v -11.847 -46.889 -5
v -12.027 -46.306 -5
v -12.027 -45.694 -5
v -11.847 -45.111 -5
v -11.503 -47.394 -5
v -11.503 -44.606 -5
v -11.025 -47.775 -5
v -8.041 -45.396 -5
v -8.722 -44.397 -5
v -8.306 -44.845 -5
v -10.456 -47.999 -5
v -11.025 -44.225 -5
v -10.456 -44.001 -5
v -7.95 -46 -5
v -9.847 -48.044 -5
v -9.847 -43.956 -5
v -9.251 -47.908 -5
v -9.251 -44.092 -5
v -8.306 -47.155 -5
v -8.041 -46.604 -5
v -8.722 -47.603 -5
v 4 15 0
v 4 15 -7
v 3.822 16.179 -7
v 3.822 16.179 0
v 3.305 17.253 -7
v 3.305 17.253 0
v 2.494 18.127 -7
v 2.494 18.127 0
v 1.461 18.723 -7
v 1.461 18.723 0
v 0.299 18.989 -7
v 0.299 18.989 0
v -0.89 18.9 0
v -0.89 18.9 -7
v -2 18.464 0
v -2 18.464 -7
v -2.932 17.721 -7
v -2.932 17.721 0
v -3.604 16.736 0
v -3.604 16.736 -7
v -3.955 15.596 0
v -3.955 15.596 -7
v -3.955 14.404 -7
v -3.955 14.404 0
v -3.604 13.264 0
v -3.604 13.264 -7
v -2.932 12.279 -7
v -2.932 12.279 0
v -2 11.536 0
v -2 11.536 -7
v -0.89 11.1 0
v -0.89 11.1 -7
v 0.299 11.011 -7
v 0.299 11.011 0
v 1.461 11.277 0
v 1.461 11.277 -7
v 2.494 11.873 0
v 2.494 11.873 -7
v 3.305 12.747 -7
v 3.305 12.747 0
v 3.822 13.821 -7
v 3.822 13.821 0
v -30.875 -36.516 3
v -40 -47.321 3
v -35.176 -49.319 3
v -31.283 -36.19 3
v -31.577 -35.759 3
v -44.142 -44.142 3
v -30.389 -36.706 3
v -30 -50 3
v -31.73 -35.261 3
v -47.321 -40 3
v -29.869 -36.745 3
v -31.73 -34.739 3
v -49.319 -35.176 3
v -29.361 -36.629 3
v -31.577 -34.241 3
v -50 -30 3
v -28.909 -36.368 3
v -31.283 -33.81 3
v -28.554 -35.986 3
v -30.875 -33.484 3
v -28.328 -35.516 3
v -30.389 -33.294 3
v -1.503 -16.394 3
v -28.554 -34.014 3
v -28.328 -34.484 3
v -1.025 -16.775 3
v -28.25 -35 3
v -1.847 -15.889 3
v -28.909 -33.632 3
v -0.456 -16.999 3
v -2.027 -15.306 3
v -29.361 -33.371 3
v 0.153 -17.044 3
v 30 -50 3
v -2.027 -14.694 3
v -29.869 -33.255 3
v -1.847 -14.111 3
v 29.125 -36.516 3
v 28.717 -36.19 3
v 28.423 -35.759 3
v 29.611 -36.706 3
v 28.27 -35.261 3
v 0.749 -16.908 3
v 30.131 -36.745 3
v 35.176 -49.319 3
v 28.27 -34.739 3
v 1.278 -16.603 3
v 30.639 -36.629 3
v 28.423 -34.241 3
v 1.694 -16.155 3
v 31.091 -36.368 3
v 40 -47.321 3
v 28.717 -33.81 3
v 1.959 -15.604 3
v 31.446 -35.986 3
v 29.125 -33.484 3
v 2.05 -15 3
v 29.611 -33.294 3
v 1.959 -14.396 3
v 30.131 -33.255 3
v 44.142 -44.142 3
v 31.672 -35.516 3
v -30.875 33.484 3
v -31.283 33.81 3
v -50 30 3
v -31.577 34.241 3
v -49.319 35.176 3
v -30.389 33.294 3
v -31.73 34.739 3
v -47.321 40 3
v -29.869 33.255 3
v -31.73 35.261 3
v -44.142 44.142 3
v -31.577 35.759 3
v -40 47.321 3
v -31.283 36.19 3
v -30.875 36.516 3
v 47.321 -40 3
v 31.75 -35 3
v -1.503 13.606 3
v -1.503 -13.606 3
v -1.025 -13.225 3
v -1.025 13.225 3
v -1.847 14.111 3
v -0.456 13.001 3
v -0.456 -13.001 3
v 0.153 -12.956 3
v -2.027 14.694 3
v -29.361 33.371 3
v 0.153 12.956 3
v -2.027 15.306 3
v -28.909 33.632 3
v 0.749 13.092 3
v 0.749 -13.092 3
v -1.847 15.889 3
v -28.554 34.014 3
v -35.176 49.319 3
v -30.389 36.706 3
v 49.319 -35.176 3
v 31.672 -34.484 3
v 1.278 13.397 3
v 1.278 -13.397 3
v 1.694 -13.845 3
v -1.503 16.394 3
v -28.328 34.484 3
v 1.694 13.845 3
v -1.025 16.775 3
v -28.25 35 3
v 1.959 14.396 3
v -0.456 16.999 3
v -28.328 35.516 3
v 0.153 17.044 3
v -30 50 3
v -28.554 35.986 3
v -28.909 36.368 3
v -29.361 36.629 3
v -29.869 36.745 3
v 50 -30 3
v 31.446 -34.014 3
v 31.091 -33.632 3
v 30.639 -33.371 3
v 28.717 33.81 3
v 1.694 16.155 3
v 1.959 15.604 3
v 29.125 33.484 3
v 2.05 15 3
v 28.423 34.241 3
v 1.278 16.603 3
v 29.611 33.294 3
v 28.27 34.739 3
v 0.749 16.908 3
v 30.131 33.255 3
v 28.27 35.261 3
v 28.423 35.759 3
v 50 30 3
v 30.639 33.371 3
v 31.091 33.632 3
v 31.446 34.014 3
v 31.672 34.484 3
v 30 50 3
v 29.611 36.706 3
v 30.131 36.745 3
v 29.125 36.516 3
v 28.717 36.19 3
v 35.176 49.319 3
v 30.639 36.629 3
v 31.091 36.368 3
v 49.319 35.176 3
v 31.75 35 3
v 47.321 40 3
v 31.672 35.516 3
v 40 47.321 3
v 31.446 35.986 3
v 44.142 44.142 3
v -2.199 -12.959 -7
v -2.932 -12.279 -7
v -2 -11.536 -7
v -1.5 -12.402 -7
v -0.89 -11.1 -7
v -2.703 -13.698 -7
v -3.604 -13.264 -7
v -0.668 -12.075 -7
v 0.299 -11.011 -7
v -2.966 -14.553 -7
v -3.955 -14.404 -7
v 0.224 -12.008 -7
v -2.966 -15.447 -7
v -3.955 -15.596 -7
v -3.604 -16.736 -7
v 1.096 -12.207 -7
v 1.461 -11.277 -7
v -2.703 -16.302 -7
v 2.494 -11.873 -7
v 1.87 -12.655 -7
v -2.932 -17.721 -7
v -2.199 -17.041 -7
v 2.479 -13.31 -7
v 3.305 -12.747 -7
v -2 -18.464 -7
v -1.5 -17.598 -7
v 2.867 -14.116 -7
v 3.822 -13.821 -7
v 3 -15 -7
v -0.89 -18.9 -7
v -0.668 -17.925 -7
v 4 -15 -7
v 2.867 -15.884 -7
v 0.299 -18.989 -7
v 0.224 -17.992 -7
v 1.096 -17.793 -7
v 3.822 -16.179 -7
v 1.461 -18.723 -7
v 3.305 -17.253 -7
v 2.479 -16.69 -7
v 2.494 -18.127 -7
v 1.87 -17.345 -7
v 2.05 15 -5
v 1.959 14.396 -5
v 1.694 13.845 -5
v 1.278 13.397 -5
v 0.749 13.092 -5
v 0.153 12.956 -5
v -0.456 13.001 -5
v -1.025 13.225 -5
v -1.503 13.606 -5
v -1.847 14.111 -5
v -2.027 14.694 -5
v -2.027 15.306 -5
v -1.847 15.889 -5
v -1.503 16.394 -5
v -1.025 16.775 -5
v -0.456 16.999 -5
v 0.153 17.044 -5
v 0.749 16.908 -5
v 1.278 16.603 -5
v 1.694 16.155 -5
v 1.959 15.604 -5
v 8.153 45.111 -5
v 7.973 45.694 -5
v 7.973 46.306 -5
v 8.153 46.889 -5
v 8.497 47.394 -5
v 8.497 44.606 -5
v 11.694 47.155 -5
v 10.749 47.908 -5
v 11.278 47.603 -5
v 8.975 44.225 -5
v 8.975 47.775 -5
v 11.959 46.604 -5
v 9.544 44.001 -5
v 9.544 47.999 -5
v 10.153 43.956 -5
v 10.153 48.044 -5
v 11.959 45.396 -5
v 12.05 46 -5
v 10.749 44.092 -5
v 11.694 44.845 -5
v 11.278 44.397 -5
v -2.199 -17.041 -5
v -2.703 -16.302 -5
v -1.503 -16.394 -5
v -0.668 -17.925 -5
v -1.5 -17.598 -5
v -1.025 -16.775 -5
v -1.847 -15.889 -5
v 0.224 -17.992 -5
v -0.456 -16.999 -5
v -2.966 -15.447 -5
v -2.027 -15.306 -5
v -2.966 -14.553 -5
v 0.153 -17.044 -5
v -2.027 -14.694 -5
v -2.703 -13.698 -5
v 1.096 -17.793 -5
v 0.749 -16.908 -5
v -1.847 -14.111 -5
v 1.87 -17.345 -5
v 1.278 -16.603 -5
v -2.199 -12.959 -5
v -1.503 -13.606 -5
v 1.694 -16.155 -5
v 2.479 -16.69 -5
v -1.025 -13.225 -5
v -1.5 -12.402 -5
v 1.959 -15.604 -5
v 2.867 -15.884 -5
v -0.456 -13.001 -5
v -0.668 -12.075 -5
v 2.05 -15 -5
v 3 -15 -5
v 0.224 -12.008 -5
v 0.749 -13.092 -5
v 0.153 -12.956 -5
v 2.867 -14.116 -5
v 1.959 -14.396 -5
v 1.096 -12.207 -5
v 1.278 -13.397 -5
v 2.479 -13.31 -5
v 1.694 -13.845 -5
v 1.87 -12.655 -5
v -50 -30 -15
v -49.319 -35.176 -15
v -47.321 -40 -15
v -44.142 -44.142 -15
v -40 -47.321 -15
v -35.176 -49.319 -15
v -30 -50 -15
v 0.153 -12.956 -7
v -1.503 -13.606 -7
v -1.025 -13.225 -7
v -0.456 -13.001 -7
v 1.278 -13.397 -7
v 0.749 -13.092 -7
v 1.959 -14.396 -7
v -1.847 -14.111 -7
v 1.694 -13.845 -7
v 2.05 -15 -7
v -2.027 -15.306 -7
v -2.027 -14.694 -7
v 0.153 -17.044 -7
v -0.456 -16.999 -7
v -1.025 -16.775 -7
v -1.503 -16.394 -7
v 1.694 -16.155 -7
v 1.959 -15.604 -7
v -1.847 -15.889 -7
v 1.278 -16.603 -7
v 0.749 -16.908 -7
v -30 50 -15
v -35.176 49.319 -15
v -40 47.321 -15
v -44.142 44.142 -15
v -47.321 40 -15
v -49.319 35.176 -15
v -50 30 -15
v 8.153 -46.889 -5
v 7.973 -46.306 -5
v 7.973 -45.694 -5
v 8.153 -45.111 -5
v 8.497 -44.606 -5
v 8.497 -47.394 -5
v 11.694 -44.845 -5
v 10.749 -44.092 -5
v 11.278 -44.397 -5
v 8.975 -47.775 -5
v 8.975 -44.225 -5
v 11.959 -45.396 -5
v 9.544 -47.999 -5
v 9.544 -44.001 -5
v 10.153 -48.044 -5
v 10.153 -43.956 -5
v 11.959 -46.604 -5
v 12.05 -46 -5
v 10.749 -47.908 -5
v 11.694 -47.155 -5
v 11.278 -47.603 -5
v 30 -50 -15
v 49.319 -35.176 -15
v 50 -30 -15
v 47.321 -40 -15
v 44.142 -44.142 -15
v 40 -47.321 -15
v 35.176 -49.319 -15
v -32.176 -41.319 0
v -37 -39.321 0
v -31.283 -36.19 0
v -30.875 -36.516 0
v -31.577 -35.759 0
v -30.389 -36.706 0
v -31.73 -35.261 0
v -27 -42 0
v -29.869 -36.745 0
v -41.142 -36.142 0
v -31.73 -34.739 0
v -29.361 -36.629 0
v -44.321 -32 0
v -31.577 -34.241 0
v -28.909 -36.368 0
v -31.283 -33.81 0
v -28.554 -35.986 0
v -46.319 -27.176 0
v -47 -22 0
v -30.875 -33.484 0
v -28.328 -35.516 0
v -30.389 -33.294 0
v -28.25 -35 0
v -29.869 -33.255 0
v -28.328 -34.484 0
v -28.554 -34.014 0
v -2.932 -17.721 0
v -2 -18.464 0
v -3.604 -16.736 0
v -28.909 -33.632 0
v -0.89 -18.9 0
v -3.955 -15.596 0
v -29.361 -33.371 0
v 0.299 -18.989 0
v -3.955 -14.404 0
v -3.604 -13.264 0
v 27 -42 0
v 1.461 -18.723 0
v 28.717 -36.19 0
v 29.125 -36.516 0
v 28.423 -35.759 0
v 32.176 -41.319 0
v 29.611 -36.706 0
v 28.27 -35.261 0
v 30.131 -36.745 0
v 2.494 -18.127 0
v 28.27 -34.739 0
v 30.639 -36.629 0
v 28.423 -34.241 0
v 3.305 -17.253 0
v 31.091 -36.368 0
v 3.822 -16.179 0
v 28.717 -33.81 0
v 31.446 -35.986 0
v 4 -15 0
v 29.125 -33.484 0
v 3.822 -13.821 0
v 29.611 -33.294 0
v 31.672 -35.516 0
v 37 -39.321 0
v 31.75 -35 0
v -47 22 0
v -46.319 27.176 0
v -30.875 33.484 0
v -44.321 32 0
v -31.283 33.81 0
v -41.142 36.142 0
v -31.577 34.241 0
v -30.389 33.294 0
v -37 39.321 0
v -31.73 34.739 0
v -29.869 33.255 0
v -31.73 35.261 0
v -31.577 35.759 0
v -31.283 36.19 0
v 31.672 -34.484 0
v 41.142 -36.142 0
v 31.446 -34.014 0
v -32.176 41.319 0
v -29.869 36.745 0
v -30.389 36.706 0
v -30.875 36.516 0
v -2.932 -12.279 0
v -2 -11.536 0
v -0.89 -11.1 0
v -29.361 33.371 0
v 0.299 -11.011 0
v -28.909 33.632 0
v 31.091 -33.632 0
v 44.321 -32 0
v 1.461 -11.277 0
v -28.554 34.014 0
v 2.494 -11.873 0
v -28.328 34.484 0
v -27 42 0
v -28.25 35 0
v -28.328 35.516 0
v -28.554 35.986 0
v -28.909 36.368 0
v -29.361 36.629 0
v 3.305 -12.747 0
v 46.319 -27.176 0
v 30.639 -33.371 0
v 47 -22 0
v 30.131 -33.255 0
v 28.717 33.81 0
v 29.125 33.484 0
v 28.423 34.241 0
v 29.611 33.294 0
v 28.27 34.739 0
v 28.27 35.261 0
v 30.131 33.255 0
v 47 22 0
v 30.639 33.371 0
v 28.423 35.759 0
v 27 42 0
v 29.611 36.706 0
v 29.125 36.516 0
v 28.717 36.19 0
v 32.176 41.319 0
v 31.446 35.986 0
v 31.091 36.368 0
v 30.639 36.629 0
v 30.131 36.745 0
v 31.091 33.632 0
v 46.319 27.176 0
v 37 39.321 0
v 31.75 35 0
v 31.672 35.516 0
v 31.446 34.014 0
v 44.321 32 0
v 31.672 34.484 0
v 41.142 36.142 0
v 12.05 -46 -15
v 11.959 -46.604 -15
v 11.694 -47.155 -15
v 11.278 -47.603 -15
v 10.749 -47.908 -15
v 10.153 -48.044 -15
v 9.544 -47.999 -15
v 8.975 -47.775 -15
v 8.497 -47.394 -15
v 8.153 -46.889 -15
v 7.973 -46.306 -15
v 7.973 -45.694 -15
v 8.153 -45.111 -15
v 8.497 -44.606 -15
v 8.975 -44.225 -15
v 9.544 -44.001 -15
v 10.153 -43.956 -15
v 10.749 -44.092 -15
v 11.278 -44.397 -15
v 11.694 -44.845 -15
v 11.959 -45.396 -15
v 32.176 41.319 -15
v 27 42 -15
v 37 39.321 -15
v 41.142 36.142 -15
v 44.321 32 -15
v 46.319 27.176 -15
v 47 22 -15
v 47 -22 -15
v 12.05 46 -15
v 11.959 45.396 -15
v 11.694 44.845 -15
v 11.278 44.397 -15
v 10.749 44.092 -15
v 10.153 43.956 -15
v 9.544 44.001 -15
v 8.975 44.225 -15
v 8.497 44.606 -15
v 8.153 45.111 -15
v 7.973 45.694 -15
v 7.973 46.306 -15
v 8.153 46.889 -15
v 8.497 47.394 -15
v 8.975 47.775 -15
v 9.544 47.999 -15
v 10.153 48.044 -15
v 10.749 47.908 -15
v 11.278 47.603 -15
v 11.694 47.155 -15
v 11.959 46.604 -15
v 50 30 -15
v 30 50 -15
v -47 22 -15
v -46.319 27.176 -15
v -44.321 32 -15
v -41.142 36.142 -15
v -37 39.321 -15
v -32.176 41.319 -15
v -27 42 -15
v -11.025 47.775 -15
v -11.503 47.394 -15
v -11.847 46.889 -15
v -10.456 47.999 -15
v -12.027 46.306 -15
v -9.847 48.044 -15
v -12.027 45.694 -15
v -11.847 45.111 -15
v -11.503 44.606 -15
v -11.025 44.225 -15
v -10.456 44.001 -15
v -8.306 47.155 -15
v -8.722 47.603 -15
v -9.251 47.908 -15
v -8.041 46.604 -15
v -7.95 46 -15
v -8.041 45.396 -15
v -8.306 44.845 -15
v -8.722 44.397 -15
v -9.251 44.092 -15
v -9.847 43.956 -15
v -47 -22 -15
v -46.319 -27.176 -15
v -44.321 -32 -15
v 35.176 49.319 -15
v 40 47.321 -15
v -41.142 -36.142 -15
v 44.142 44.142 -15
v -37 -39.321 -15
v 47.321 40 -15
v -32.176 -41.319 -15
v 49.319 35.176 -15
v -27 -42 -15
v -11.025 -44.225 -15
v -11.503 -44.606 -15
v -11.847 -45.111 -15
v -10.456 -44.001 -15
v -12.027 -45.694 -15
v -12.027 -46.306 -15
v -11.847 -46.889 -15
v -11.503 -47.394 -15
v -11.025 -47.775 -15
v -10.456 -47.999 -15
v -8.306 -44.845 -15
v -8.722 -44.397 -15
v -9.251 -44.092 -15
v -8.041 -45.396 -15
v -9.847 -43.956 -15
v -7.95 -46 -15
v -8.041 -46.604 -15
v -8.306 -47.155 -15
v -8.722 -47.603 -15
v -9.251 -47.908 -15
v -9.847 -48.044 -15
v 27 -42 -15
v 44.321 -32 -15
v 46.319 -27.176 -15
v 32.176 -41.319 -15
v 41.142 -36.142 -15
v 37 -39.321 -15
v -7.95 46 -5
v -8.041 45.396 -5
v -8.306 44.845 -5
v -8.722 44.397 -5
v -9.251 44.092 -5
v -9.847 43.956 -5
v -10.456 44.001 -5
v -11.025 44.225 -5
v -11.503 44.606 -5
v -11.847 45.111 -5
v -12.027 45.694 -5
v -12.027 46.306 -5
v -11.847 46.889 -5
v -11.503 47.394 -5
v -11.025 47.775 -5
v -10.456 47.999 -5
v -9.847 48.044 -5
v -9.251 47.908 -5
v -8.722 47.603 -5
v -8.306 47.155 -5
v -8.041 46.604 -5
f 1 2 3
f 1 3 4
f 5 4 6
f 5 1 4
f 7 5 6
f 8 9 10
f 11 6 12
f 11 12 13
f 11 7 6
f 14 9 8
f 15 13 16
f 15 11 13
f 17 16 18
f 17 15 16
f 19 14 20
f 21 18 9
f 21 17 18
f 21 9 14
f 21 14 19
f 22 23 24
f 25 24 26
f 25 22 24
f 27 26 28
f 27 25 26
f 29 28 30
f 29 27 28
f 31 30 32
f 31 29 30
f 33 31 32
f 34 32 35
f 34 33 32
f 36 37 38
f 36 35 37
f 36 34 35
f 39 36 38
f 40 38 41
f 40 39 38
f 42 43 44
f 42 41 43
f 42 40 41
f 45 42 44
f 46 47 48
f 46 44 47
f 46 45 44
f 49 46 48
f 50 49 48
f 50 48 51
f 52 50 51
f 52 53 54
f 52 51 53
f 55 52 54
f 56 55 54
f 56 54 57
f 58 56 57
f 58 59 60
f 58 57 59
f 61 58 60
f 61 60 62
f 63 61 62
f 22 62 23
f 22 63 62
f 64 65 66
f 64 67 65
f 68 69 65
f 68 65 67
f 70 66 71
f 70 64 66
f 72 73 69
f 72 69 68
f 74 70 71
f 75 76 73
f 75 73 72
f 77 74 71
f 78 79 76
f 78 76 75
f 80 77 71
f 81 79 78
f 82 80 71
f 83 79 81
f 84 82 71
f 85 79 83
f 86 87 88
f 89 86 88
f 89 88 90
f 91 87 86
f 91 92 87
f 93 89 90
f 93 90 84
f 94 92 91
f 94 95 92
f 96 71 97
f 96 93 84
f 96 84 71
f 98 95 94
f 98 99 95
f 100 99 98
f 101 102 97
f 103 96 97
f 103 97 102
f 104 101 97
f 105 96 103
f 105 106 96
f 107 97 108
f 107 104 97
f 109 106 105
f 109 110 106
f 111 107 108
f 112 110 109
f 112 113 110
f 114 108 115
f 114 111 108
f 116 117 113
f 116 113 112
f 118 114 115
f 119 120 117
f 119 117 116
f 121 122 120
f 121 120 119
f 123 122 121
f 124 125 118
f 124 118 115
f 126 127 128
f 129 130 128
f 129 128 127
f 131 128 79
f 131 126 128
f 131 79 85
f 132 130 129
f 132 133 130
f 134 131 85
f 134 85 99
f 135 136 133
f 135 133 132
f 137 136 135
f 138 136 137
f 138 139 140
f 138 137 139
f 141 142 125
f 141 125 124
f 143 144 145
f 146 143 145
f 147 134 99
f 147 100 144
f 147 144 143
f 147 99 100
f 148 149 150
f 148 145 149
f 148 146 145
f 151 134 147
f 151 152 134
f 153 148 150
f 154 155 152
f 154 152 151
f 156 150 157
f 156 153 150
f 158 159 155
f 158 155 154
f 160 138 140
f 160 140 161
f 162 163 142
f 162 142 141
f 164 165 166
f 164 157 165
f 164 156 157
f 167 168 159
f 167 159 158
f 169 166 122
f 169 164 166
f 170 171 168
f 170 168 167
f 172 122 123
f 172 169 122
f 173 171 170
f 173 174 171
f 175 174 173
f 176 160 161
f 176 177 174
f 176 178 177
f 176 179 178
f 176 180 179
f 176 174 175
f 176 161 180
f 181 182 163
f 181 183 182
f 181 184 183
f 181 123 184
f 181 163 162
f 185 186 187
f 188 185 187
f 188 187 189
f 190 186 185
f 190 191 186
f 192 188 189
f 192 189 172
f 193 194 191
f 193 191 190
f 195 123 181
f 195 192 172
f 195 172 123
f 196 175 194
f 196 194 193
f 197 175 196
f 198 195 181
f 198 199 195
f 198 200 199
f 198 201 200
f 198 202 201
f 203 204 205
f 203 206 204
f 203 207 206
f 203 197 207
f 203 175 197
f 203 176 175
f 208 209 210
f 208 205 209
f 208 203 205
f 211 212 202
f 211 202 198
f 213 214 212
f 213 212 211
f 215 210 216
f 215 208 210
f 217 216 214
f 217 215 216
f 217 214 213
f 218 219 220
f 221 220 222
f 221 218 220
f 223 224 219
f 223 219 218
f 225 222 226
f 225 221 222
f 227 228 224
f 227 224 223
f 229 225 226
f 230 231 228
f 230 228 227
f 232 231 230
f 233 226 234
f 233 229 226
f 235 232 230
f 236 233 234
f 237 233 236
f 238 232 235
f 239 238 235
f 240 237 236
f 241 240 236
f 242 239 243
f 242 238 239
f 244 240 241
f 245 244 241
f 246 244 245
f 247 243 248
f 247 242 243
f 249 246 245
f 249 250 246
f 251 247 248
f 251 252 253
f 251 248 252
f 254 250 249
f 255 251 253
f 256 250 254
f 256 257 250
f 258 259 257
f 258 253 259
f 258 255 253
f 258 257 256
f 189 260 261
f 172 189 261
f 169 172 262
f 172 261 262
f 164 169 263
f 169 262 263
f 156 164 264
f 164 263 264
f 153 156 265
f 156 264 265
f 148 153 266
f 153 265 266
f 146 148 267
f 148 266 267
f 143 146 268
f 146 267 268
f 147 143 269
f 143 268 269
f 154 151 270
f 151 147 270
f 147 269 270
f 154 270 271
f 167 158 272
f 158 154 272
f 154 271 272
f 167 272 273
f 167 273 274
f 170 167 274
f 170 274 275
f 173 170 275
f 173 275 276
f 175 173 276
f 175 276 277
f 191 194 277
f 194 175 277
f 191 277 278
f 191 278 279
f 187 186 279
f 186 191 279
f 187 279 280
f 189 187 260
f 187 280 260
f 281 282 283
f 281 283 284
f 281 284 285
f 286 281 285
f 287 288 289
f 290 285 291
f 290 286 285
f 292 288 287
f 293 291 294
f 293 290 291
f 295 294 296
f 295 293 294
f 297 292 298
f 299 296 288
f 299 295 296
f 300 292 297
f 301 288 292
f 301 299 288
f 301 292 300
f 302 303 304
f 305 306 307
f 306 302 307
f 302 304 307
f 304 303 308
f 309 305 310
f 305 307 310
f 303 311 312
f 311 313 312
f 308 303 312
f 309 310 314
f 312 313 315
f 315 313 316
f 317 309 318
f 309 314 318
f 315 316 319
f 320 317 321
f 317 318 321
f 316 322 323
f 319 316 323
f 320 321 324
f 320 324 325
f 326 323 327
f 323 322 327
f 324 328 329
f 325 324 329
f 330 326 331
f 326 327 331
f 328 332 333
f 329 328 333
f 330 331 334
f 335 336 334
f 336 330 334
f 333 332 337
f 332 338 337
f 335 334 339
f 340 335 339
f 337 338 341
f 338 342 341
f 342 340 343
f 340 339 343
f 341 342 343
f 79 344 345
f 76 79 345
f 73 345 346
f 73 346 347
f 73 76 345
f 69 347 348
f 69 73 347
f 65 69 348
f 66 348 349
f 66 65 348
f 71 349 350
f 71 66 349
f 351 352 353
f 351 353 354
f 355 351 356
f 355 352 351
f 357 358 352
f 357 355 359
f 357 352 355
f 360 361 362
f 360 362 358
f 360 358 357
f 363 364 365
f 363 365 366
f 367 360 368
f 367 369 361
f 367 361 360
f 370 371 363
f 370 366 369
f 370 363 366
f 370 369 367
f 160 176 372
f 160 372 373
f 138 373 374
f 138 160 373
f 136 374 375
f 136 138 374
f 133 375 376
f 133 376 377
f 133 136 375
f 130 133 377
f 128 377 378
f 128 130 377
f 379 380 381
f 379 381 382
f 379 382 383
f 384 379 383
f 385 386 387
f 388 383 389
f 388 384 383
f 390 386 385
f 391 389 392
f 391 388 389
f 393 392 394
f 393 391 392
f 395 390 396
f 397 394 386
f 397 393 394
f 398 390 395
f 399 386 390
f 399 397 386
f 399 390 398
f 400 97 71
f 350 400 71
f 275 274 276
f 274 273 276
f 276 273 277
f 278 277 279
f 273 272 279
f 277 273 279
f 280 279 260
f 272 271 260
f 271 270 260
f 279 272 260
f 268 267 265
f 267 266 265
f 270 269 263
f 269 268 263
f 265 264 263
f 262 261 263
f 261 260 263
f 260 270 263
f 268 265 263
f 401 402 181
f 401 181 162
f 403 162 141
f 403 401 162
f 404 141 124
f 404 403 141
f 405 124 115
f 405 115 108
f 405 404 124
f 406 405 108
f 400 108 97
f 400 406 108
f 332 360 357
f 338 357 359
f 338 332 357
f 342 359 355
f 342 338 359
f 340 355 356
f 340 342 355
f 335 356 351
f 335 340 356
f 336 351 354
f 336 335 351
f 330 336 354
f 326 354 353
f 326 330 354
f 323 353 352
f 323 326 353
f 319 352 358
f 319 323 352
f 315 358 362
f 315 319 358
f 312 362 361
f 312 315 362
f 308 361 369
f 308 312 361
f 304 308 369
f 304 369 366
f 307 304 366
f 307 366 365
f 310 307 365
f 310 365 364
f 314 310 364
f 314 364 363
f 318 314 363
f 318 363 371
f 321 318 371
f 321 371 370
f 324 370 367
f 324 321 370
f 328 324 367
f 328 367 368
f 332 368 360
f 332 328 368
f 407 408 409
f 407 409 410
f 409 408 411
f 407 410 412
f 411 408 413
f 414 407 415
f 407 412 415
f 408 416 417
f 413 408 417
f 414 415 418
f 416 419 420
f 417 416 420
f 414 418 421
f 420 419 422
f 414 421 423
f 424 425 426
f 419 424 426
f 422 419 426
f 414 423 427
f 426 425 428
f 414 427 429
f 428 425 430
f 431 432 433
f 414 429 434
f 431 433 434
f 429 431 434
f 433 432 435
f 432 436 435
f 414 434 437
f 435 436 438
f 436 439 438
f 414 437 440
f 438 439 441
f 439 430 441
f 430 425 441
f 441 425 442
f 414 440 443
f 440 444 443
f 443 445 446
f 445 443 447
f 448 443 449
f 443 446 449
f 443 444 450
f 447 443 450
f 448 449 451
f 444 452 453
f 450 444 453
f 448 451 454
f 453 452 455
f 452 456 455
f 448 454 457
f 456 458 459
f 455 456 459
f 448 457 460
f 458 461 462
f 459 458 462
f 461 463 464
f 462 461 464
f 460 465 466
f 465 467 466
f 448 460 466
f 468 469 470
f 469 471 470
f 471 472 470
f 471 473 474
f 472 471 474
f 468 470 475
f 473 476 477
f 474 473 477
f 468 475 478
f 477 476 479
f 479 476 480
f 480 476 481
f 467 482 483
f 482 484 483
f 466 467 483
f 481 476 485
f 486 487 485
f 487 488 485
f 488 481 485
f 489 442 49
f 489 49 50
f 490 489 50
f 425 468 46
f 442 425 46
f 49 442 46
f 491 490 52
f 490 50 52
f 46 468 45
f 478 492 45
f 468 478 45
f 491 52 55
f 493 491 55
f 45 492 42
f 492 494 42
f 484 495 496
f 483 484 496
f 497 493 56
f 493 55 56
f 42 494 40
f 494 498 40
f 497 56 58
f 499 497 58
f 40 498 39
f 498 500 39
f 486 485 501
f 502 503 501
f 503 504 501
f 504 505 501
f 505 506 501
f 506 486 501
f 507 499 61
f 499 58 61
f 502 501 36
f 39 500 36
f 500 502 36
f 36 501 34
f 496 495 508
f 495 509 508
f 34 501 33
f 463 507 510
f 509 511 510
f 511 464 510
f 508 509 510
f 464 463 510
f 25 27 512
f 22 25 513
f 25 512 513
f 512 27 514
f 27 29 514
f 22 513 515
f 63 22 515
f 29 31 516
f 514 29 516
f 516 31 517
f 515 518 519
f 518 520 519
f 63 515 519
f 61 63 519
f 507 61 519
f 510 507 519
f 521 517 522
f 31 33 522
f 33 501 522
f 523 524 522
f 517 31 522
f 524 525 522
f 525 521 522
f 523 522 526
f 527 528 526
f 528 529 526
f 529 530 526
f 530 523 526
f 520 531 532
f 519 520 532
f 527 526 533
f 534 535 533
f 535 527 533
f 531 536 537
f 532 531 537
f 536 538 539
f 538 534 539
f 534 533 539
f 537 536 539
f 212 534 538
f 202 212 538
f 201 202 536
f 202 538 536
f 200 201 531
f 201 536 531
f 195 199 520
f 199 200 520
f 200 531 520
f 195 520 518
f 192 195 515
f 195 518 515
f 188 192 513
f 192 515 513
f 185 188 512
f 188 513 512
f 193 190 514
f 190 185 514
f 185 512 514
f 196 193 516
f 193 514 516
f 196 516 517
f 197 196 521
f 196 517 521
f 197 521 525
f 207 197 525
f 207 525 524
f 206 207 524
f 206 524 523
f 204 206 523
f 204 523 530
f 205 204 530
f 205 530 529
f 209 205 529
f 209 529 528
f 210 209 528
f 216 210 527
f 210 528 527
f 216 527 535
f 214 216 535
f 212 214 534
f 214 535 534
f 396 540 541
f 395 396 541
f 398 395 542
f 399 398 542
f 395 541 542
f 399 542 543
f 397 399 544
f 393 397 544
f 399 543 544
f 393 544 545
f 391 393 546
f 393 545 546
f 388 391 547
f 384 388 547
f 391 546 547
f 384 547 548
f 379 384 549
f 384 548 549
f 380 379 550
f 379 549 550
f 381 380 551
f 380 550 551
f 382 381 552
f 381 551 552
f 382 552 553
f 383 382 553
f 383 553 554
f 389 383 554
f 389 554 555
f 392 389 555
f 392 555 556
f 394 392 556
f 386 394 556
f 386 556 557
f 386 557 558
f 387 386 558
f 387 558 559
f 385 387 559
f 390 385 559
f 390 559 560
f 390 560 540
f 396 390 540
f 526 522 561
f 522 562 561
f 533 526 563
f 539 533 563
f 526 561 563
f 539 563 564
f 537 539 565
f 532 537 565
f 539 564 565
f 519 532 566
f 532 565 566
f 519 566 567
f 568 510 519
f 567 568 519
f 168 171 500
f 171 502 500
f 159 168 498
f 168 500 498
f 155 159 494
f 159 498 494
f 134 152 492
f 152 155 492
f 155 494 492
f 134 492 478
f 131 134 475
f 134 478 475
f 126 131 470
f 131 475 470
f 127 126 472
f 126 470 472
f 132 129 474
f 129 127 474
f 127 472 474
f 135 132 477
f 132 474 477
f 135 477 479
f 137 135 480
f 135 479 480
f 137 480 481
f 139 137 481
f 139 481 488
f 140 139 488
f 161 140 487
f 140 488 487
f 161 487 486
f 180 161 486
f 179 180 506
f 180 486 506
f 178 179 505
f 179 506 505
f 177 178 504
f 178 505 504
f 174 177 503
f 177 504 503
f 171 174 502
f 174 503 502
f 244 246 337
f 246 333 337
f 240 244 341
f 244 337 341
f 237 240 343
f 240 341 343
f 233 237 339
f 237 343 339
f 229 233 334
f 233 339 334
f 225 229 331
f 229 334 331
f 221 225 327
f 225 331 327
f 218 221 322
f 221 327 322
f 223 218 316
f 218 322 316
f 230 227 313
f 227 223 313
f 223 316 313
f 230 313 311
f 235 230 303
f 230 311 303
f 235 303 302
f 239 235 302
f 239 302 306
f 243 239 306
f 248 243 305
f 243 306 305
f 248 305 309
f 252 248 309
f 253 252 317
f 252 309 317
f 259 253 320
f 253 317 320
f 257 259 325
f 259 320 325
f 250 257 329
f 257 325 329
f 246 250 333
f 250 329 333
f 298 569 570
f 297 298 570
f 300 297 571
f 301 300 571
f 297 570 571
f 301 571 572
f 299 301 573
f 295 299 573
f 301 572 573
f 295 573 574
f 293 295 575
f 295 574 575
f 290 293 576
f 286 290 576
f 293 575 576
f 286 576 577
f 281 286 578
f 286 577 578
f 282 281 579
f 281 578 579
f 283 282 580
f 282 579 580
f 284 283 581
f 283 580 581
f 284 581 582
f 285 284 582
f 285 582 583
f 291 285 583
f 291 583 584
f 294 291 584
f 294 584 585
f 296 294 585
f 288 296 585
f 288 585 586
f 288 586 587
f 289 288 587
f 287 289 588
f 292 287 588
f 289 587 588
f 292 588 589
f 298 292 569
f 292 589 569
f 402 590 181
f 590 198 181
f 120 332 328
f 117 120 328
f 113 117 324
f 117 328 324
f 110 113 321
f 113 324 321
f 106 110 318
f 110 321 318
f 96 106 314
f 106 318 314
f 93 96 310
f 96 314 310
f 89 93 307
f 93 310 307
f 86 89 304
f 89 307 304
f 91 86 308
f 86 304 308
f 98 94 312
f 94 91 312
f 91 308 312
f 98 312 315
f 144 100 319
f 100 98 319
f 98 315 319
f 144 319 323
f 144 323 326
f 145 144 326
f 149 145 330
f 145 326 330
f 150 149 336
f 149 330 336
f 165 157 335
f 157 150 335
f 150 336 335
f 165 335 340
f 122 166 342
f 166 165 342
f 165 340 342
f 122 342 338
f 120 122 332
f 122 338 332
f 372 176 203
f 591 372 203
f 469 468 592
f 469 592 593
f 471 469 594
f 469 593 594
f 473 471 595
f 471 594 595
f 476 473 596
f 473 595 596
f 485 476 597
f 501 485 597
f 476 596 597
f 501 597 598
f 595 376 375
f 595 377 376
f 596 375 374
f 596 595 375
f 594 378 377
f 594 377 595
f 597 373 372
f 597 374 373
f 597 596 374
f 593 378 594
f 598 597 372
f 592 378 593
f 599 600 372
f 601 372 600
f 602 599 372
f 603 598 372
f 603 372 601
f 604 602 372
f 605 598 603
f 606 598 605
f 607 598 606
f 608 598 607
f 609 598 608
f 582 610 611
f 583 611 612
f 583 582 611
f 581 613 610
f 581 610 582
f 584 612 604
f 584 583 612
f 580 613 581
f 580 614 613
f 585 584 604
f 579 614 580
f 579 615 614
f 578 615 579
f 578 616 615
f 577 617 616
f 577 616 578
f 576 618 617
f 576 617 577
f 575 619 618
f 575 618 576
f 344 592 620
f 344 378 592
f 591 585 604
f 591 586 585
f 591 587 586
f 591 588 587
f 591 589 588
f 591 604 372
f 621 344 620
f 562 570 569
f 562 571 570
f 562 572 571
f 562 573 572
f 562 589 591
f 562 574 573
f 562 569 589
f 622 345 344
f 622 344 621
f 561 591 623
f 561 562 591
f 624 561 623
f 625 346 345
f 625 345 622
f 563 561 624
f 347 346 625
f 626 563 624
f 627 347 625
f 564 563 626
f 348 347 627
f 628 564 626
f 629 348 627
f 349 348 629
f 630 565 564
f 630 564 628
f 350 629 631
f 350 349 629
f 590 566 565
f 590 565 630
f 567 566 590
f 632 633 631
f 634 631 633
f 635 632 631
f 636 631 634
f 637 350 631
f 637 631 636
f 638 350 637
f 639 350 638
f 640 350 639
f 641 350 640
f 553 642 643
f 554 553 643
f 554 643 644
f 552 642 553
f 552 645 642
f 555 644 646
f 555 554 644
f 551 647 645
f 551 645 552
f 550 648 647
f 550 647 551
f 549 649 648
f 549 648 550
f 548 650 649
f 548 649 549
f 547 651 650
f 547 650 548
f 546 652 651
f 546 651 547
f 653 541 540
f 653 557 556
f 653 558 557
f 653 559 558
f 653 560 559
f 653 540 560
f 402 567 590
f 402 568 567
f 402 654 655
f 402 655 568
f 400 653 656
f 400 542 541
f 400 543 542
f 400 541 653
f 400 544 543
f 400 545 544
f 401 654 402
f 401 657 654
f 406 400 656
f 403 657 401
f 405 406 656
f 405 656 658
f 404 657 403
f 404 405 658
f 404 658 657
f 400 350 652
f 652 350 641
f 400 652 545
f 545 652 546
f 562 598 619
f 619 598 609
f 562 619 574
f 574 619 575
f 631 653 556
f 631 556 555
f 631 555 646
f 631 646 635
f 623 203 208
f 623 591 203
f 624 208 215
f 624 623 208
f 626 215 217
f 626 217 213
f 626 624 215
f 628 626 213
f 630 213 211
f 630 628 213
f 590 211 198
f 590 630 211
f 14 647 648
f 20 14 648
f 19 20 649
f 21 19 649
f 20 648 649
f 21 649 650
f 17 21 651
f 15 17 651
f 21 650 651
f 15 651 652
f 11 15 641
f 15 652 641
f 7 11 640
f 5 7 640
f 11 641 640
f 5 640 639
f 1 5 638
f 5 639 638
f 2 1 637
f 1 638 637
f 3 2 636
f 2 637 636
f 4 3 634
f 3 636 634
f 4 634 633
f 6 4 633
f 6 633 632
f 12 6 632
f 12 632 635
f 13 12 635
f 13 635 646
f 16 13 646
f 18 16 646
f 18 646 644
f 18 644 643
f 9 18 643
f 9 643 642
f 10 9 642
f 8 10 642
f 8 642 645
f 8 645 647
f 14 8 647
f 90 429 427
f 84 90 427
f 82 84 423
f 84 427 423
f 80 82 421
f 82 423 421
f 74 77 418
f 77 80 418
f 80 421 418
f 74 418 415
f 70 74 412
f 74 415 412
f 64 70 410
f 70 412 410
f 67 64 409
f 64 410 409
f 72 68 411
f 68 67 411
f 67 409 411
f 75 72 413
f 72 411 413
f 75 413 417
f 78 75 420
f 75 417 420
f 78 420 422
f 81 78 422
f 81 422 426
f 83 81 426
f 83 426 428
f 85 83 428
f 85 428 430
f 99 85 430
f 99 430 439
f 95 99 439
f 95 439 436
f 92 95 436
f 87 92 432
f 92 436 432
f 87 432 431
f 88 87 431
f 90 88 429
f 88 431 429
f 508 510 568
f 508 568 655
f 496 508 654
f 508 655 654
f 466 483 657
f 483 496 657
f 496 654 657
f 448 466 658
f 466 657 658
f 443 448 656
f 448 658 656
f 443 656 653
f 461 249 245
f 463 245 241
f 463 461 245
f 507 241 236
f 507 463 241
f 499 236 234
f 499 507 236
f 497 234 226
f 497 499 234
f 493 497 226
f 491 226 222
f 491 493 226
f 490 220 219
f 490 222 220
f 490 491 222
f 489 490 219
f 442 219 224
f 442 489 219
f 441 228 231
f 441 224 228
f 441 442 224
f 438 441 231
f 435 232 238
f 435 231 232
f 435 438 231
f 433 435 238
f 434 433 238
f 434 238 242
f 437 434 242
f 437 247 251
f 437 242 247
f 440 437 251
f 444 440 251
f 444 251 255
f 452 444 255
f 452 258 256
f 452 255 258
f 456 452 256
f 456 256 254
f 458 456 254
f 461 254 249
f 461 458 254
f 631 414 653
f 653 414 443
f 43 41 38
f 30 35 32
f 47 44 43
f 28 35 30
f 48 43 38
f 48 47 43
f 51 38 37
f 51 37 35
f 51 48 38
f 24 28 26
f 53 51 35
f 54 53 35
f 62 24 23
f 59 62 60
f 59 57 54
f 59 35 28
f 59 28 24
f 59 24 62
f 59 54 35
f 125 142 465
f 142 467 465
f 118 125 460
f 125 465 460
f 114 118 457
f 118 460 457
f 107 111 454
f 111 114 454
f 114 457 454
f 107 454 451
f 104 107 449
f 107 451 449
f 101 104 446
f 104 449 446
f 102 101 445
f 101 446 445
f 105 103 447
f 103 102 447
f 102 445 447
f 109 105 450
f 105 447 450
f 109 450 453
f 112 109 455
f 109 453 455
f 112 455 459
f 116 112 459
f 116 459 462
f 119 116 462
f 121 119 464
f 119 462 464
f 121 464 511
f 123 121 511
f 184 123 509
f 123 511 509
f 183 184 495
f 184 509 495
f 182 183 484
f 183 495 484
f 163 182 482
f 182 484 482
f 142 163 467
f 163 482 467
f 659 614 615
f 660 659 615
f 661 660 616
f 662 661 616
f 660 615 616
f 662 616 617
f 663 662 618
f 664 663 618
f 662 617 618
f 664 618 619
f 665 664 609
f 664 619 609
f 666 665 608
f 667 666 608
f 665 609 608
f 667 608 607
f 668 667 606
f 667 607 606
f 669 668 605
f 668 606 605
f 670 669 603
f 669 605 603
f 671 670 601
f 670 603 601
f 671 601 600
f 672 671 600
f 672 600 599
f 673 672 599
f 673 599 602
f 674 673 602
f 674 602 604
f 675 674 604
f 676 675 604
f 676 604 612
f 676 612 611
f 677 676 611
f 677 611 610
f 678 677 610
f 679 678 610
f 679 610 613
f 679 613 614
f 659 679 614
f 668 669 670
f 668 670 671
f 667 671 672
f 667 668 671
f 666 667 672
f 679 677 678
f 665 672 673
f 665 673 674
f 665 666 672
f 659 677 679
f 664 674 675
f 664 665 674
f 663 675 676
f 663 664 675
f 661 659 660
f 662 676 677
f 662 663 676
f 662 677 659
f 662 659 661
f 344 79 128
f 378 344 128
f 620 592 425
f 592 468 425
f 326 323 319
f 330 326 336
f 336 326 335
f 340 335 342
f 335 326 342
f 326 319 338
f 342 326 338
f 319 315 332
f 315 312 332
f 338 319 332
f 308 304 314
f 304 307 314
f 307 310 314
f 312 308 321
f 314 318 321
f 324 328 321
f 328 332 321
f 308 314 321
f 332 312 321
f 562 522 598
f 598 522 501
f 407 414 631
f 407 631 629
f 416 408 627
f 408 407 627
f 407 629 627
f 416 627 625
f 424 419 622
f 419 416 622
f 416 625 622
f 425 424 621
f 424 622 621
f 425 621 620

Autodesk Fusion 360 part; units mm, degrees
sketch "Sketch1" plane through (0, 0, 0) normal (0, 0, 1) x (1, 0, 0)
  line L0 (50, 50) -> (-50, 50)
  line L1 (-50, 50) -> (-50, -50)
  line L2 (-50, -50) -> (50, -50)
  line L3 (50, -50) -> (50, 50)
  line L4 (50, 50) -> (-50, -50) construction
  line L5 (-50, 50) -> (50, -50) construction
  circle A0 centre (0, 15) radius 2.05
  circle A1 centre (0, -15) radius 2.05
  circle A2 centre (0, 15) radius 4
  circle A3 centre (0, -15) radius 4
  circle A4 centre (30, -35) radius 1.75
  circle A5 centre (30, 35) radius 1.75
  line L6 (0, 0) -> (0, 5)
  circle A6 centre (-30, 35) radius 1.75
  circle A7 centre (-30, -35) radius 1.75
  dimension "d1" = 100
  dimension "d2" = 100
  dimension "d4" = 4.1
  dimension "d5" = 15
  dimension "d6" = 15
  dimension "d8" = 8
  dimension "d36" = 3.5
  dimension "d37" = 3.5
  dimension "d55" = 30
  dimension "d56" = 35
  dimension "d57" = 35
  dimension "d58" = 30
extrude "Extrude1" add sketch "Sketch1" along normal blind 3 contours L0 L1 L2 L3 | A2 | A3
extrude "Extrude2" add sketch "Sketch1" against normal blind 5 contours A2 | A3
sketch "Sketch2" plane through (0, 0, -5) normal (0, 0, -1) x (1, 0, 0)
  circle A0 centre (0, 15) radius 2.05
  circle A1 centre (0, 15) radius 4
  circle A2 centre (0, 15) radius 3
  circle A3 centre (0, -15) radius 4
  dimension "d40" = 8
extrude "Extrude3" add sketch "Sketch2" along normal blind 2
sketch "Sketch3" plane through (0, 0, 0) normal (0, 0, -1) x (1, 0, 0)
  circle A0 centre (0, -15) radius 4
  circle A1 centre (0, 15) radius 4
  line L0 (50, -50) -> (50, 50)
  line L1 (50, 50) -> (-50, 50)
  line L2 (-50, 50) -> (-50, -50)
  line L3 (-50, -50) -> (50, -50)
  circle A2 centre (30, 35) radius 1.75
  circle A3 centre (30, -35) radius 1.75
  line L4 (-47, 42) -> (47, 42)
  line L5 (47, 42) -> (47, -42)
  line L6 (47, -42) -> (-47, -42)
  line L7 (-47, -42) -> (-47, 42)
  circle A4 centre (-30, 35) radius 1.75
  circle A5 centre (-30, -35) radius 1.75
  dimension "d41" = 3
  dimension "d42" = 3
  dimension "d43" = 8
  dimension "d44" = 8
extrude "Extrude4" add sketch "Sketch3" along normal blind 15 contours L0 L1 L2 L3
sketch "Sketch6" plane through (0, 0, -15) normal (0, 0, -1) x (1, 0, 0)
  line L0 (47, -42) -> (-47, -42)
  line L1 (-47, -42) -> (-47, 42)
  line L2 (-47, 42) -> (47, 42)
  line L3 (47, 42) -> (47, -42)
  line L4 (-50, -50) -> (50, -50)
  line L5 (50, -50) -> (50, 50)
  line L6 (50, 50) -> (-50, 50)
  line L7 (-50, 50) -> (-50, -50)
  line L8 (0, 0) -> (20, 0)
  circle A0 centre (10, 46) radius 2.05
  line L9 (0, 0) -> (0, 5)
  circle A1 centre (-10, 46) radius 2.05
  circle A2 centre (10, -46) radius 2.05
  circle A3 centre (-10, -46) radius 2.05
  dimension "d45" = 4.1
  dimension "d61" = 4
  dimension "d62" = 10
extrude "Extrude7" cut sketch "Sketch6" against normal blind 10 contours A0 | A1 | A2 | A3
fillet "Fillet3" radius 20 8 edges at (47, -42, -7.5) (47, 42, -7.5) (-47, -42, -7.5) (50, -50, -6) (-50, -50, -6) (-50, 50, -6) (-47, 42, -7.5) (50, 50, -6)
